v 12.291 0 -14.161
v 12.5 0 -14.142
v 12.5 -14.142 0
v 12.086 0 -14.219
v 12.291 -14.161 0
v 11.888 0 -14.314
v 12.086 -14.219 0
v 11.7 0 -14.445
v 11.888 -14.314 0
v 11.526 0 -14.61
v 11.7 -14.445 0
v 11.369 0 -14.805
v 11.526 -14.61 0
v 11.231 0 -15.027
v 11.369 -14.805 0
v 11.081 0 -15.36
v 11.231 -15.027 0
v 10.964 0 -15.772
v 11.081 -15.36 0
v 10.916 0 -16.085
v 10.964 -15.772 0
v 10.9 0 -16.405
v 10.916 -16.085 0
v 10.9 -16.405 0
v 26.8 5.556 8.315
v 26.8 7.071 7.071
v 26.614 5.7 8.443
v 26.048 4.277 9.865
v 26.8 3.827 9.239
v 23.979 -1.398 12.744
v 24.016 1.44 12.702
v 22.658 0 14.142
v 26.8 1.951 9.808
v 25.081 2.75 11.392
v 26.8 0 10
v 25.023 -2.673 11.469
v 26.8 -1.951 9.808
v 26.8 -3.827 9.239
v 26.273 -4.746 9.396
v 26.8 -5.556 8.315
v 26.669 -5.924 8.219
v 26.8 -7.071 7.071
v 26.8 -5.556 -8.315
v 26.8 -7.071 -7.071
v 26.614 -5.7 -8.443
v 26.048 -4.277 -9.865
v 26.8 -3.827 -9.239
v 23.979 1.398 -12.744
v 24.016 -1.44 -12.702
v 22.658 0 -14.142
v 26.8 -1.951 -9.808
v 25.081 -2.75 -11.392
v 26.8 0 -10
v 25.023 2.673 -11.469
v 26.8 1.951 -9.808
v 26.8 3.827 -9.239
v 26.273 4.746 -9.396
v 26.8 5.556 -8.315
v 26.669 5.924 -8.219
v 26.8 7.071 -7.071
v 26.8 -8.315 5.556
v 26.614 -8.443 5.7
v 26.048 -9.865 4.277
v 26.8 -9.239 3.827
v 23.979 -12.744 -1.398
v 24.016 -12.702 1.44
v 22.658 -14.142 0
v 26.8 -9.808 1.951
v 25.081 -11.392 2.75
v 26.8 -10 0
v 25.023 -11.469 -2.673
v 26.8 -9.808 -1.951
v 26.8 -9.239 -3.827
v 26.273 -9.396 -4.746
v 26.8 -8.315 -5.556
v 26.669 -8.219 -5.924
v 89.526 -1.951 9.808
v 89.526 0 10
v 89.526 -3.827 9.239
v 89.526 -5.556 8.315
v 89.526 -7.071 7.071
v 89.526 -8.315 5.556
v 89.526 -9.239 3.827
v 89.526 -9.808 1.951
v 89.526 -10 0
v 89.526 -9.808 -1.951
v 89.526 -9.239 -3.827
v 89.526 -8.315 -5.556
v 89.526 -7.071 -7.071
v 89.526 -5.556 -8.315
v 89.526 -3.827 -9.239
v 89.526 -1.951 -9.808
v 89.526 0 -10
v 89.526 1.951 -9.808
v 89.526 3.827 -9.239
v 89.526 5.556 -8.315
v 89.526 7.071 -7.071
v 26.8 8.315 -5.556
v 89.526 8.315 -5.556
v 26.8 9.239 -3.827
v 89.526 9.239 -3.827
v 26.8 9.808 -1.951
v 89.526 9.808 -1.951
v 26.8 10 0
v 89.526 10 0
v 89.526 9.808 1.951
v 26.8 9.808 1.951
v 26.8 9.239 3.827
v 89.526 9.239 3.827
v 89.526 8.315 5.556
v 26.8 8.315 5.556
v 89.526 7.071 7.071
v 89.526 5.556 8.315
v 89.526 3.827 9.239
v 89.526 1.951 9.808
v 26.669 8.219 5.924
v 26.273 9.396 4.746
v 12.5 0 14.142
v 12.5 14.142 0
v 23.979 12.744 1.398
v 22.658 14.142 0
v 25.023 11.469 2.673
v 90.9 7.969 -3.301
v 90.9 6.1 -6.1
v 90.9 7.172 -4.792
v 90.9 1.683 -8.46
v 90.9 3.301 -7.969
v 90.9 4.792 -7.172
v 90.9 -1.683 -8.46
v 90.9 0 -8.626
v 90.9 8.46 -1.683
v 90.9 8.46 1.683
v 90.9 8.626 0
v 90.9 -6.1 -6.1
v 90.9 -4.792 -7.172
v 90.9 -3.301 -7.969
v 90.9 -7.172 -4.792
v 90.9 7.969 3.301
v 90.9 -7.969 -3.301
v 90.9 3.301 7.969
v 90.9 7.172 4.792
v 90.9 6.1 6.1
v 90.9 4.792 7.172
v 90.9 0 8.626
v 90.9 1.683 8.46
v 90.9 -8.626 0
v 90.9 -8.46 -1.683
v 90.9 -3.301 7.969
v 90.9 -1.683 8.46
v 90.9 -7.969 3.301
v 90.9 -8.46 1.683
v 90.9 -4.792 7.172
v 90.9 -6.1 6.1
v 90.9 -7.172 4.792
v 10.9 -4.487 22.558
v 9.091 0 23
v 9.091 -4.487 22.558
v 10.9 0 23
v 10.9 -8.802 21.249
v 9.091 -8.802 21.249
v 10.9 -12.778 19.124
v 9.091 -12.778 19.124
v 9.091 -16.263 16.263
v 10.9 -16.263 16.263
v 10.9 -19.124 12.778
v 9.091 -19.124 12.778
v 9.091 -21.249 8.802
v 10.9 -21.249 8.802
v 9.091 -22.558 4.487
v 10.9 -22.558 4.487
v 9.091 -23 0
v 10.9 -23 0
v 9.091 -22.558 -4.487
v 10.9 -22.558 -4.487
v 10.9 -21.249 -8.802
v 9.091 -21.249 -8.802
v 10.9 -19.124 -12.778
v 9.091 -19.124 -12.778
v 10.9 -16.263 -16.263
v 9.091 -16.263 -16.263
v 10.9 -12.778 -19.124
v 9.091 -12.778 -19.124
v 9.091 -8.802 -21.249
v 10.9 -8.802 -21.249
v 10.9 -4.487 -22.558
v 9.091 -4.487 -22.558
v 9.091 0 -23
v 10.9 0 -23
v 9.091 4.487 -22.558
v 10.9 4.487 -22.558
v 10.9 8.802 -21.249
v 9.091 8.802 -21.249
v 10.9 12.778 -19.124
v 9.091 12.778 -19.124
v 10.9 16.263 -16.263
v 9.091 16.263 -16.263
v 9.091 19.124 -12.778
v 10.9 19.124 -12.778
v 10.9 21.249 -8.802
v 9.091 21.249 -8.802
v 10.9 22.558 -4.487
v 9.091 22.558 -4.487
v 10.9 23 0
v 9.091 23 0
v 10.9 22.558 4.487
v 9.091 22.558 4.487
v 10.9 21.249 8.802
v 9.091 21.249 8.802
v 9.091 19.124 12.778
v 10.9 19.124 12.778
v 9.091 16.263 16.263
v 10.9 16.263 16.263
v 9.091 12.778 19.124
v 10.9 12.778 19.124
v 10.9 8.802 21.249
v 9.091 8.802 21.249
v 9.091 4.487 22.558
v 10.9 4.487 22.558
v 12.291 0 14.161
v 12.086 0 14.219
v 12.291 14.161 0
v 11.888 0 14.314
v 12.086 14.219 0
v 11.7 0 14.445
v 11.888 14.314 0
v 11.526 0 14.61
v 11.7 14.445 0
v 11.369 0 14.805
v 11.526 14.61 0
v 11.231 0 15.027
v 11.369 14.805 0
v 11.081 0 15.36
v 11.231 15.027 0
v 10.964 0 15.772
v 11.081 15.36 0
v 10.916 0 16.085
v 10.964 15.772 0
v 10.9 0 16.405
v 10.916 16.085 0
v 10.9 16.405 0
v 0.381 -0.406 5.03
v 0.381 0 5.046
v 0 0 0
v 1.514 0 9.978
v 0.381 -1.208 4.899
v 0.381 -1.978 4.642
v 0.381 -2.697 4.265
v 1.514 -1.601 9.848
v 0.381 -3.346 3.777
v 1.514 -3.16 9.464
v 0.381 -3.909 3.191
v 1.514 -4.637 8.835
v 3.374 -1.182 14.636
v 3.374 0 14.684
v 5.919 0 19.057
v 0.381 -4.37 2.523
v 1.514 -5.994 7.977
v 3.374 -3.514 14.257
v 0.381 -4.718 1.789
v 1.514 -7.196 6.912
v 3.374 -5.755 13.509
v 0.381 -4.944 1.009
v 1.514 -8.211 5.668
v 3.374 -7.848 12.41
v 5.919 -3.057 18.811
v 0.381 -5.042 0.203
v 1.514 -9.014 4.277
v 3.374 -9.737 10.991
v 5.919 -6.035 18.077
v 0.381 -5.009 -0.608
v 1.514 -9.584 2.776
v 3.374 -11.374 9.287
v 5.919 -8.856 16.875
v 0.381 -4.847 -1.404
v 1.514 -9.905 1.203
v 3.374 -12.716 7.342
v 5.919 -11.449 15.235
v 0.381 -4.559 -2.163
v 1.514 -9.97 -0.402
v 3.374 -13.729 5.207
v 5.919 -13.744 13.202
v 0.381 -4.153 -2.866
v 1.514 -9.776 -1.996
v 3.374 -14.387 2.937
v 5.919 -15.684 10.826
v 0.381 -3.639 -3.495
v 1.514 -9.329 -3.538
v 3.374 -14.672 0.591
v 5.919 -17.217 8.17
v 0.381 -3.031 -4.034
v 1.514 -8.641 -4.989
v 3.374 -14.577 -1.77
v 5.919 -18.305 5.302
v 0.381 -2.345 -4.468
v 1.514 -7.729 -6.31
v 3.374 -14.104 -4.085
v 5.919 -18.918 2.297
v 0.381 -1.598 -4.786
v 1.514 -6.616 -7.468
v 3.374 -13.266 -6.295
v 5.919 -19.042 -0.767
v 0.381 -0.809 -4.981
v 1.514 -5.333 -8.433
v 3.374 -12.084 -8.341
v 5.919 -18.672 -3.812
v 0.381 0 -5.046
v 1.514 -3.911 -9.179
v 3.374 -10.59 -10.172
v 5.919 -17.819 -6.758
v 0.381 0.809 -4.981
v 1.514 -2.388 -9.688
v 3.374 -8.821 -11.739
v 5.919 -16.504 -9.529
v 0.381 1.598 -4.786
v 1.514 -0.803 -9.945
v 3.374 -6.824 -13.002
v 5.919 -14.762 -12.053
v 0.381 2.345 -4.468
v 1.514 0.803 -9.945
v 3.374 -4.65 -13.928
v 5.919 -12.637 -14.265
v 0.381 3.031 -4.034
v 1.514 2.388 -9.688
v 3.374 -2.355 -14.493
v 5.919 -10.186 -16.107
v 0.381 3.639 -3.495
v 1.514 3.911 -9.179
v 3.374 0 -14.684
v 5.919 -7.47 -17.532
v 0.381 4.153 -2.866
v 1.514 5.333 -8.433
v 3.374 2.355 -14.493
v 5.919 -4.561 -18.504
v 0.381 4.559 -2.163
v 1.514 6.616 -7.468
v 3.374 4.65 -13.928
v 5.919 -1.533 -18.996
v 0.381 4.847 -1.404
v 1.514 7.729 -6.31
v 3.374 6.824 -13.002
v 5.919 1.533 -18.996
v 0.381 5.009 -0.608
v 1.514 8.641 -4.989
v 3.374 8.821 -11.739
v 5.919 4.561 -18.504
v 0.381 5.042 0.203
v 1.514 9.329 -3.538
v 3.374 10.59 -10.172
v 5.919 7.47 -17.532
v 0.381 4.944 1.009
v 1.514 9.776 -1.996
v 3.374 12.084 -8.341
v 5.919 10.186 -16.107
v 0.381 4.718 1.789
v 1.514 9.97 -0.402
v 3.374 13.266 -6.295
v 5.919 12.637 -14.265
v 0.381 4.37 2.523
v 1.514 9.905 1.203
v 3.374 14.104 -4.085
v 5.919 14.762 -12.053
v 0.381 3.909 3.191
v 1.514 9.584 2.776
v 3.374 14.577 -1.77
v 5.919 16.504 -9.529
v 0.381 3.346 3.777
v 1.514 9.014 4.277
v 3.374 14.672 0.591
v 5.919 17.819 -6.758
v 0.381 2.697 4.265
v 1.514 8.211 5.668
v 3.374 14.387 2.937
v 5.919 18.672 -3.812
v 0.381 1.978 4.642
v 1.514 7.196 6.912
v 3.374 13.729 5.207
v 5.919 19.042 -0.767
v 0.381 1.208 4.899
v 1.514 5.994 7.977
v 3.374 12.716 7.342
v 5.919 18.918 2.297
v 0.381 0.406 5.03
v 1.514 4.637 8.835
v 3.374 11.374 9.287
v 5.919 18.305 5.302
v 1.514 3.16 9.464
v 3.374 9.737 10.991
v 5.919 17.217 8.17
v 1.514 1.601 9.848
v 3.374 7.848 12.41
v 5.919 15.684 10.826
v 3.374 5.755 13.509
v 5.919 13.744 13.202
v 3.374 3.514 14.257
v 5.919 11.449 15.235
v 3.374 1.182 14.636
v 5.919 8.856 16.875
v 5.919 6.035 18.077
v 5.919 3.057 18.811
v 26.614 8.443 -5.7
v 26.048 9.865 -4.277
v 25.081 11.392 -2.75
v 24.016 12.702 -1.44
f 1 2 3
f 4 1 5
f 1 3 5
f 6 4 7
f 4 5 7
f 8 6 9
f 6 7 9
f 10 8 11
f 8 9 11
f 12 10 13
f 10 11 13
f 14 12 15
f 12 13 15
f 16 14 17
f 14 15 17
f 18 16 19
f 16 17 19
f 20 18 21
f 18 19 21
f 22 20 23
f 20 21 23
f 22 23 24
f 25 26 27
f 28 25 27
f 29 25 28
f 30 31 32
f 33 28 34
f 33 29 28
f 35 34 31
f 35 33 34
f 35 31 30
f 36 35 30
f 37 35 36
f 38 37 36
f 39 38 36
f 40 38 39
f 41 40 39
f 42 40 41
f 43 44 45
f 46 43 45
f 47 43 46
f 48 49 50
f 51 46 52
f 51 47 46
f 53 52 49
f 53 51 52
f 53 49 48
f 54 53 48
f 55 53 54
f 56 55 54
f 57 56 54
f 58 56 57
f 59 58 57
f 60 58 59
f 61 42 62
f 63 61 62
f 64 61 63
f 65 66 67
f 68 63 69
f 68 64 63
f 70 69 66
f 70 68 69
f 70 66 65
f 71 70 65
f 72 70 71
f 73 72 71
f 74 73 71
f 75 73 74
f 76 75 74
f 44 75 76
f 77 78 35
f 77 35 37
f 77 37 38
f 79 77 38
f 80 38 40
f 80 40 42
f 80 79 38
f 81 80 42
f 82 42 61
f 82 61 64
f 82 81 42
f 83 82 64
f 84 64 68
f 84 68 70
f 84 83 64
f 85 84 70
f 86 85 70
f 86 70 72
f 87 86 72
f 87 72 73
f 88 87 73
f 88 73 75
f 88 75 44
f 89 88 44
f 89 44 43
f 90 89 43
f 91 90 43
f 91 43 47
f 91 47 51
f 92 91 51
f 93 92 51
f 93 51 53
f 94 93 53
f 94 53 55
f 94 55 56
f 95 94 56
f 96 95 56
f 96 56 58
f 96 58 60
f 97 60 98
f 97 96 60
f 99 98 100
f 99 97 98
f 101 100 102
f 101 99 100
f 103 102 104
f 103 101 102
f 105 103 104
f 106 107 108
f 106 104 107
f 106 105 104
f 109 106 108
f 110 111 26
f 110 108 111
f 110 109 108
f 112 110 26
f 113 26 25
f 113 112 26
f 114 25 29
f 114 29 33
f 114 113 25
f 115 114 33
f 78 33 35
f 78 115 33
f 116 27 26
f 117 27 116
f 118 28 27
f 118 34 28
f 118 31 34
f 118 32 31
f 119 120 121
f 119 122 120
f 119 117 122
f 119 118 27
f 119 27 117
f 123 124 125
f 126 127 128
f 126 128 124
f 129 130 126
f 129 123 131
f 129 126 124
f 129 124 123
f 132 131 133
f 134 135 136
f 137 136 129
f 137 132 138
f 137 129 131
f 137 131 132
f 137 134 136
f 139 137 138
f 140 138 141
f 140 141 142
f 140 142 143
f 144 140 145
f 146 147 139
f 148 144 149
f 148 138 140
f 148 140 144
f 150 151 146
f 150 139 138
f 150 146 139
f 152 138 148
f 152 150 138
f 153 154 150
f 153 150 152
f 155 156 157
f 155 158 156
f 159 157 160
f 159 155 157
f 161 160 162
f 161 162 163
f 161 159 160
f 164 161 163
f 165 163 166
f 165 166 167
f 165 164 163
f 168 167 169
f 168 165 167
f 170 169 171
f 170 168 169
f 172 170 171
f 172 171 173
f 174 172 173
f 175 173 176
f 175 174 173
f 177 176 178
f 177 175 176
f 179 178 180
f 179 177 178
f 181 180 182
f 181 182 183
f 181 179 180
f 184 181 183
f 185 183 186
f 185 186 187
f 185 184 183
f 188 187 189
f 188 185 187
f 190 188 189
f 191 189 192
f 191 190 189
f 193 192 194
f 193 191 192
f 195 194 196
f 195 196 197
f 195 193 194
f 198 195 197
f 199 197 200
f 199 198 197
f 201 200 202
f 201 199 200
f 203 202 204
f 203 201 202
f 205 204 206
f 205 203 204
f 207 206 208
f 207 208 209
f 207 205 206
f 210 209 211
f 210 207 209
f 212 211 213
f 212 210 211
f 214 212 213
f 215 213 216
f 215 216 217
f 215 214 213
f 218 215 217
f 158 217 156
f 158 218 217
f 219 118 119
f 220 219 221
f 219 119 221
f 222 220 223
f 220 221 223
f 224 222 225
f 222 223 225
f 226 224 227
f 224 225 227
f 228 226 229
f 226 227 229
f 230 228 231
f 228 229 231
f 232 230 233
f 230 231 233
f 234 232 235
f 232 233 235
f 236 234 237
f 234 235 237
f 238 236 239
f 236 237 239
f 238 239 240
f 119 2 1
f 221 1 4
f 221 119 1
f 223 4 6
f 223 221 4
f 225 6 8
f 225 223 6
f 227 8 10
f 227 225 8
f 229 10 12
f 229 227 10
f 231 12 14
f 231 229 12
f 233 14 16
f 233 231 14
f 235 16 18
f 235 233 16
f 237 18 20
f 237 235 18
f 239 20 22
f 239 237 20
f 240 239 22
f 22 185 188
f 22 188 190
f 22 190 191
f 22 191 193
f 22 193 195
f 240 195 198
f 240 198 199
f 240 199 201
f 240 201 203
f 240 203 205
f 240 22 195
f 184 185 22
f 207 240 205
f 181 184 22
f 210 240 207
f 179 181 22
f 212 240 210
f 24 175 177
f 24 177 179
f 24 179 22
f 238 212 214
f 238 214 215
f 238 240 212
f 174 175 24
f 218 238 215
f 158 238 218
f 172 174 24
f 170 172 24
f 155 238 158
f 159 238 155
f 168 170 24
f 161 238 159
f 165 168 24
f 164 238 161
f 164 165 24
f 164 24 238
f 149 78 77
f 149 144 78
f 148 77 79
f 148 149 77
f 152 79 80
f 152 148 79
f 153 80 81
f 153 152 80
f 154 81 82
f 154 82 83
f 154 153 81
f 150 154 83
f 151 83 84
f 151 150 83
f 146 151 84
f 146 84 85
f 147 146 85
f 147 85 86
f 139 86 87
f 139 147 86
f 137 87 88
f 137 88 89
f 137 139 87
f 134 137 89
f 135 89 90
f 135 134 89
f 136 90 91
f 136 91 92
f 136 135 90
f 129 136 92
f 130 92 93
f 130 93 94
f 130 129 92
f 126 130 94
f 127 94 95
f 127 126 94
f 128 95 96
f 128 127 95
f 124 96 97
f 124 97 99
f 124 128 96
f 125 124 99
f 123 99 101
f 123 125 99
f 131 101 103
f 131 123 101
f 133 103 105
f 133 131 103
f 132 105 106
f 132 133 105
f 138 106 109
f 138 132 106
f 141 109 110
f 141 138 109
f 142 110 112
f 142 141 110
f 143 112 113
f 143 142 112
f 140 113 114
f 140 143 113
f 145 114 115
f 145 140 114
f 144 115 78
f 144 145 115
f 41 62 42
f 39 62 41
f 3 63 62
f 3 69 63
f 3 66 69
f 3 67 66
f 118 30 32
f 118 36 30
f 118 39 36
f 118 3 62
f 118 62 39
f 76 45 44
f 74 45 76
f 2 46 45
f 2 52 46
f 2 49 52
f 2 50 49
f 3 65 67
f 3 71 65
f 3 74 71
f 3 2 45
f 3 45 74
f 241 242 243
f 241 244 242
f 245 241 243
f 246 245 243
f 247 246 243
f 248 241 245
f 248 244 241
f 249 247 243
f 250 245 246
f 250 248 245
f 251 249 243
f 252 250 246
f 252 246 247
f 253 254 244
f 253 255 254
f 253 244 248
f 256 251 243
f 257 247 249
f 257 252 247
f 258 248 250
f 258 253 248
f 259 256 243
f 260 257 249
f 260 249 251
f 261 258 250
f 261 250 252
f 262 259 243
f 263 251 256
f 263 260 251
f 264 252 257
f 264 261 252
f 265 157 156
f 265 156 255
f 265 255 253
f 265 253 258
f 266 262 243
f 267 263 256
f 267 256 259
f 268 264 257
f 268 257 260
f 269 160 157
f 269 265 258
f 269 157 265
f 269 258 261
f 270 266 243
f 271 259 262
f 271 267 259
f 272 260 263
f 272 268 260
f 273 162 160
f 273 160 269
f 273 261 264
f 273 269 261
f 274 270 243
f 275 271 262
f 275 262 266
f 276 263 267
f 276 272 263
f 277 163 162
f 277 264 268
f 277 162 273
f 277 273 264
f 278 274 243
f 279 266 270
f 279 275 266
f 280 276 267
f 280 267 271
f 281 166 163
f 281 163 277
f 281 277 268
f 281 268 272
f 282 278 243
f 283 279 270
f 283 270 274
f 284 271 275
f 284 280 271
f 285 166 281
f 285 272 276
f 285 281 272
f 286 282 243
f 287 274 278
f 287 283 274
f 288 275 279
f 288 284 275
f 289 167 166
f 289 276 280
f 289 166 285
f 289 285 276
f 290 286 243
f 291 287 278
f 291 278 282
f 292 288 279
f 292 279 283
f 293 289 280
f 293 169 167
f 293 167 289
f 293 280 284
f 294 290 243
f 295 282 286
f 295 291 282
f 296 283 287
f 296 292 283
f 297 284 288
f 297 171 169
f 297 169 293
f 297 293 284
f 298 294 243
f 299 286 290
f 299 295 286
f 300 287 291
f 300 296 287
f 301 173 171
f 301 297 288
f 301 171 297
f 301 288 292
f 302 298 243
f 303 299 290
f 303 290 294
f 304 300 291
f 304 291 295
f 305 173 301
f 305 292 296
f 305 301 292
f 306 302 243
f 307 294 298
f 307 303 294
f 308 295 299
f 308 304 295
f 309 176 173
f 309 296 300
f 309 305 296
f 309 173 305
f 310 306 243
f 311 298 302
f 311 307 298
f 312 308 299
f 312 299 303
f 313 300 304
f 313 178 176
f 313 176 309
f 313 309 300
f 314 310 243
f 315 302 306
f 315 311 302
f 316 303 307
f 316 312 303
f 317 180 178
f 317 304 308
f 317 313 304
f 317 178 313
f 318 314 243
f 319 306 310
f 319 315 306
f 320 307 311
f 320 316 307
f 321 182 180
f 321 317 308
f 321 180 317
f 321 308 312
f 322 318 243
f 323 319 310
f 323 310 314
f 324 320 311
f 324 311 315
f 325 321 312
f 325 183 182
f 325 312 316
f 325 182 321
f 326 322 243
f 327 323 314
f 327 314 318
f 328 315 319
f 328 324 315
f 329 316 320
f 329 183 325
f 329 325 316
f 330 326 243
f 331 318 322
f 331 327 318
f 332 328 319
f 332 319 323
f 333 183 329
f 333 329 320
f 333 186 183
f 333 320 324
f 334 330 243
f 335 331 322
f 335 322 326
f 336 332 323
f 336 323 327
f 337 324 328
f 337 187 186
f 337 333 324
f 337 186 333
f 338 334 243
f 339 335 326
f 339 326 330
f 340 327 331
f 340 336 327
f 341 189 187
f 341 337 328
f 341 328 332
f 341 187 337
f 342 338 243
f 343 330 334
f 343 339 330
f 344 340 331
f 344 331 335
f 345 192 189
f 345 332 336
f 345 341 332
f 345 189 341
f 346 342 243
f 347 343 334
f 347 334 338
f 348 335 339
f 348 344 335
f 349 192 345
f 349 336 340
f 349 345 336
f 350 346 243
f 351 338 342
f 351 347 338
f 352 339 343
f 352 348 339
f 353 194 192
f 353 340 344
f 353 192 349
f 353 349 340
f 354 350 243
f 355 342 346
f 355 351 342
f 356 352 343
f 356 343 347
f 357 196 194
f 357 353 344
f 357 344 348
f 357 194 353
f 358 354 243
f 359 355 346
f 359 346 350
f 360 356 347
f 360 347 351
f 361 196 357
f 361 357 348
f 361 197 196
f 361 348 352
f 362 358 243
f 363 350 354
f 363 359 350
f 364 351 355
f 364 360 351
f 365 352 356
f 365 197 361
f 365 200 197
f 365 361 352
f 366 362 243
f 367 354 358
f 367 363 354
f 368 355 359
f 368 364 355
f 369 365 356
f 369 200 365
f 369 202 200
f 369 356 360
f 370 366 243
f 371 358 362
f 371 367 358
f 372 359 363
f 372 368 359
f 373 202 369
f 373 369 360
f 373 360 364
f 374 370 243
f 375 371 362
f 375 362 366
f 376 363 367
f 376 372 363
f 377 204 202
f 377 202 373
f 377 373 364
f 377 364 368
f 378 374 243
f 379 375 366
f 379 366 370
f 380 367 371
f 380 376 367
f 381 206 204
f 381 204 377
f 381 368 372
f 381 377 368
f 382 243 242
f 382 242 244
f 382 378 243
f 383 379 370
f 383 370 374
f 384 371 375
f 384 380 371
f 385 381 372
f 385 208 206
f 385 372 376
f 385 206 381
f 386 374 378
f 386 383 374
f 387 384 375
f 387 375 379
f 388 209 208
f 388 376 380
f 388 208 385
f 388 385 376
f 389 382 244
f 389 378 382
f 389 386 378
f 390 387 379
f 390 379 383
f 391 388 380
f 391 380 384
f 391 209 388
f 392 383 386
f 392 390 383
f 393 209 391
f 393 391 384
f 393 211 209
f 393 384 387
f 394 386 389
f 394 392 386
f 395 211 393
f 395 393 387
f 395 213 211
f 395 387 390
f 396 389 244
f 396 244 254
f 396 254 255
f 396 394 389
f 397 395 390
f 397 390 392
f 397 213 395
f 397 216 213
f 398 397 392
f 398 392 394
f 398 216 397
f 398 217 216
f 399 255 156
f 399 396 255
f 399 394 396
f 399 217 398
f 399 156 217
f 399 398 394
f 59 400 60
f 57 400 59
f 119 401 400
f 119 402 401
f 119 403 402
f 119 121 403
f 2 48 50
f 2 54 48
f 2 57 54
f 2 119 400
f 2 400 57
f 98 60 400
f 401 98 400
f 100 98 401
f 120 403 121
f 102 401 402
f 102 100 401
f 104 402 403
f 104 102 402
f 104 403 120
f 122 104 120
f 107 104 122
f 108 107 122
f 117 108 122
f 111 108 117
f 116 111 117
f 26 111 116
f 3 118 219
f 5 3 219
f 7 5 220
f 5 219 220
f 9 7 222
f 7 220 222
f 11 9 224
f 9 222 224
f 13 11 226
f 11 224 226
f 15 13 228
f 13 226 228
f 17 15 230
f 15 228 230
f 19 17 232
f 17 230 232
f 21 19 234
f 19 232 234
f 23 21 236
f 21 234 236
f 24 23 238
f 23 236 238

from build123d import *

# Parameters (mm, degrees)
BOSS_EXTRUDE1_DEPTH = 15.9
FILLET1_R           = 1.6


with BuildPart() as part:
    # BodySke → Base-Revolve (revolve)
    with BuildSketch(Plane.XY, mode=Mode.PRIVATE) as base_revolve_sk:
        with BuildLine():
            Line((9.0906, 23), (10.9, 23))
            Line((10.9, 23), (10.9, 10))
            Line((10.9, 10), (89.526, 10))
            Line((89.526, 10), (90.9, 8.626))
            Line((90.9, 8.626), (90.9, 0))
            Line((90.9, 0), (0, 0))
            ThreePointArc((0, 0), (2.355084776, 12.365668283), (9.0906, 23))
        make_face()
    revolve(base_revolve_sk.sketch.rotate(Axis((-31.75, 0, 0), (1, 0, 0)), 90), axis=Axis((-31.75, 0, 0), (1, 0, 0)))

    # Sketch1 → Boss-Extrude1 (add)
    with BuildSketch(Plane(origin=(10.9, 0, 0), x_dir=(0, 0, -1), z_dir=(1, 0, 0))):
        Polygon((0, 14.142135624), (14.142135624, 0), (0, -14.142135624), (-14.142135624, 0), align=None)
    extrude(amount=BOSS_EXTRUDE1_DEPTH)

    # Sketch2 → Cut-Revolve1 (revolve, cut)
    with BuildSketch(Plane.XY):
        Polygon((26.8, 10), (31.8, 10), (31.8, 24), (12.8, 24), align=None)
    revolve(axis=Axis((0, 0, 0), (1, 0, 0)), mode=Mode.SUBTRACT)

    # Fillet1
    fillet1_edges = [part.edges().sort_by_distance(p)[0] for p in [
        (10.9, 7.071067812, -7.071067812),
        (10.9, -7.071067812, -7.071067812),
        (10.9, 7.071067812, 7.071067812),
        (10.9, -7.071067812, 7.071067812),
    ]]
    fillet(fillet1_edges, radius=FILLET1_R)


solid = part.part
